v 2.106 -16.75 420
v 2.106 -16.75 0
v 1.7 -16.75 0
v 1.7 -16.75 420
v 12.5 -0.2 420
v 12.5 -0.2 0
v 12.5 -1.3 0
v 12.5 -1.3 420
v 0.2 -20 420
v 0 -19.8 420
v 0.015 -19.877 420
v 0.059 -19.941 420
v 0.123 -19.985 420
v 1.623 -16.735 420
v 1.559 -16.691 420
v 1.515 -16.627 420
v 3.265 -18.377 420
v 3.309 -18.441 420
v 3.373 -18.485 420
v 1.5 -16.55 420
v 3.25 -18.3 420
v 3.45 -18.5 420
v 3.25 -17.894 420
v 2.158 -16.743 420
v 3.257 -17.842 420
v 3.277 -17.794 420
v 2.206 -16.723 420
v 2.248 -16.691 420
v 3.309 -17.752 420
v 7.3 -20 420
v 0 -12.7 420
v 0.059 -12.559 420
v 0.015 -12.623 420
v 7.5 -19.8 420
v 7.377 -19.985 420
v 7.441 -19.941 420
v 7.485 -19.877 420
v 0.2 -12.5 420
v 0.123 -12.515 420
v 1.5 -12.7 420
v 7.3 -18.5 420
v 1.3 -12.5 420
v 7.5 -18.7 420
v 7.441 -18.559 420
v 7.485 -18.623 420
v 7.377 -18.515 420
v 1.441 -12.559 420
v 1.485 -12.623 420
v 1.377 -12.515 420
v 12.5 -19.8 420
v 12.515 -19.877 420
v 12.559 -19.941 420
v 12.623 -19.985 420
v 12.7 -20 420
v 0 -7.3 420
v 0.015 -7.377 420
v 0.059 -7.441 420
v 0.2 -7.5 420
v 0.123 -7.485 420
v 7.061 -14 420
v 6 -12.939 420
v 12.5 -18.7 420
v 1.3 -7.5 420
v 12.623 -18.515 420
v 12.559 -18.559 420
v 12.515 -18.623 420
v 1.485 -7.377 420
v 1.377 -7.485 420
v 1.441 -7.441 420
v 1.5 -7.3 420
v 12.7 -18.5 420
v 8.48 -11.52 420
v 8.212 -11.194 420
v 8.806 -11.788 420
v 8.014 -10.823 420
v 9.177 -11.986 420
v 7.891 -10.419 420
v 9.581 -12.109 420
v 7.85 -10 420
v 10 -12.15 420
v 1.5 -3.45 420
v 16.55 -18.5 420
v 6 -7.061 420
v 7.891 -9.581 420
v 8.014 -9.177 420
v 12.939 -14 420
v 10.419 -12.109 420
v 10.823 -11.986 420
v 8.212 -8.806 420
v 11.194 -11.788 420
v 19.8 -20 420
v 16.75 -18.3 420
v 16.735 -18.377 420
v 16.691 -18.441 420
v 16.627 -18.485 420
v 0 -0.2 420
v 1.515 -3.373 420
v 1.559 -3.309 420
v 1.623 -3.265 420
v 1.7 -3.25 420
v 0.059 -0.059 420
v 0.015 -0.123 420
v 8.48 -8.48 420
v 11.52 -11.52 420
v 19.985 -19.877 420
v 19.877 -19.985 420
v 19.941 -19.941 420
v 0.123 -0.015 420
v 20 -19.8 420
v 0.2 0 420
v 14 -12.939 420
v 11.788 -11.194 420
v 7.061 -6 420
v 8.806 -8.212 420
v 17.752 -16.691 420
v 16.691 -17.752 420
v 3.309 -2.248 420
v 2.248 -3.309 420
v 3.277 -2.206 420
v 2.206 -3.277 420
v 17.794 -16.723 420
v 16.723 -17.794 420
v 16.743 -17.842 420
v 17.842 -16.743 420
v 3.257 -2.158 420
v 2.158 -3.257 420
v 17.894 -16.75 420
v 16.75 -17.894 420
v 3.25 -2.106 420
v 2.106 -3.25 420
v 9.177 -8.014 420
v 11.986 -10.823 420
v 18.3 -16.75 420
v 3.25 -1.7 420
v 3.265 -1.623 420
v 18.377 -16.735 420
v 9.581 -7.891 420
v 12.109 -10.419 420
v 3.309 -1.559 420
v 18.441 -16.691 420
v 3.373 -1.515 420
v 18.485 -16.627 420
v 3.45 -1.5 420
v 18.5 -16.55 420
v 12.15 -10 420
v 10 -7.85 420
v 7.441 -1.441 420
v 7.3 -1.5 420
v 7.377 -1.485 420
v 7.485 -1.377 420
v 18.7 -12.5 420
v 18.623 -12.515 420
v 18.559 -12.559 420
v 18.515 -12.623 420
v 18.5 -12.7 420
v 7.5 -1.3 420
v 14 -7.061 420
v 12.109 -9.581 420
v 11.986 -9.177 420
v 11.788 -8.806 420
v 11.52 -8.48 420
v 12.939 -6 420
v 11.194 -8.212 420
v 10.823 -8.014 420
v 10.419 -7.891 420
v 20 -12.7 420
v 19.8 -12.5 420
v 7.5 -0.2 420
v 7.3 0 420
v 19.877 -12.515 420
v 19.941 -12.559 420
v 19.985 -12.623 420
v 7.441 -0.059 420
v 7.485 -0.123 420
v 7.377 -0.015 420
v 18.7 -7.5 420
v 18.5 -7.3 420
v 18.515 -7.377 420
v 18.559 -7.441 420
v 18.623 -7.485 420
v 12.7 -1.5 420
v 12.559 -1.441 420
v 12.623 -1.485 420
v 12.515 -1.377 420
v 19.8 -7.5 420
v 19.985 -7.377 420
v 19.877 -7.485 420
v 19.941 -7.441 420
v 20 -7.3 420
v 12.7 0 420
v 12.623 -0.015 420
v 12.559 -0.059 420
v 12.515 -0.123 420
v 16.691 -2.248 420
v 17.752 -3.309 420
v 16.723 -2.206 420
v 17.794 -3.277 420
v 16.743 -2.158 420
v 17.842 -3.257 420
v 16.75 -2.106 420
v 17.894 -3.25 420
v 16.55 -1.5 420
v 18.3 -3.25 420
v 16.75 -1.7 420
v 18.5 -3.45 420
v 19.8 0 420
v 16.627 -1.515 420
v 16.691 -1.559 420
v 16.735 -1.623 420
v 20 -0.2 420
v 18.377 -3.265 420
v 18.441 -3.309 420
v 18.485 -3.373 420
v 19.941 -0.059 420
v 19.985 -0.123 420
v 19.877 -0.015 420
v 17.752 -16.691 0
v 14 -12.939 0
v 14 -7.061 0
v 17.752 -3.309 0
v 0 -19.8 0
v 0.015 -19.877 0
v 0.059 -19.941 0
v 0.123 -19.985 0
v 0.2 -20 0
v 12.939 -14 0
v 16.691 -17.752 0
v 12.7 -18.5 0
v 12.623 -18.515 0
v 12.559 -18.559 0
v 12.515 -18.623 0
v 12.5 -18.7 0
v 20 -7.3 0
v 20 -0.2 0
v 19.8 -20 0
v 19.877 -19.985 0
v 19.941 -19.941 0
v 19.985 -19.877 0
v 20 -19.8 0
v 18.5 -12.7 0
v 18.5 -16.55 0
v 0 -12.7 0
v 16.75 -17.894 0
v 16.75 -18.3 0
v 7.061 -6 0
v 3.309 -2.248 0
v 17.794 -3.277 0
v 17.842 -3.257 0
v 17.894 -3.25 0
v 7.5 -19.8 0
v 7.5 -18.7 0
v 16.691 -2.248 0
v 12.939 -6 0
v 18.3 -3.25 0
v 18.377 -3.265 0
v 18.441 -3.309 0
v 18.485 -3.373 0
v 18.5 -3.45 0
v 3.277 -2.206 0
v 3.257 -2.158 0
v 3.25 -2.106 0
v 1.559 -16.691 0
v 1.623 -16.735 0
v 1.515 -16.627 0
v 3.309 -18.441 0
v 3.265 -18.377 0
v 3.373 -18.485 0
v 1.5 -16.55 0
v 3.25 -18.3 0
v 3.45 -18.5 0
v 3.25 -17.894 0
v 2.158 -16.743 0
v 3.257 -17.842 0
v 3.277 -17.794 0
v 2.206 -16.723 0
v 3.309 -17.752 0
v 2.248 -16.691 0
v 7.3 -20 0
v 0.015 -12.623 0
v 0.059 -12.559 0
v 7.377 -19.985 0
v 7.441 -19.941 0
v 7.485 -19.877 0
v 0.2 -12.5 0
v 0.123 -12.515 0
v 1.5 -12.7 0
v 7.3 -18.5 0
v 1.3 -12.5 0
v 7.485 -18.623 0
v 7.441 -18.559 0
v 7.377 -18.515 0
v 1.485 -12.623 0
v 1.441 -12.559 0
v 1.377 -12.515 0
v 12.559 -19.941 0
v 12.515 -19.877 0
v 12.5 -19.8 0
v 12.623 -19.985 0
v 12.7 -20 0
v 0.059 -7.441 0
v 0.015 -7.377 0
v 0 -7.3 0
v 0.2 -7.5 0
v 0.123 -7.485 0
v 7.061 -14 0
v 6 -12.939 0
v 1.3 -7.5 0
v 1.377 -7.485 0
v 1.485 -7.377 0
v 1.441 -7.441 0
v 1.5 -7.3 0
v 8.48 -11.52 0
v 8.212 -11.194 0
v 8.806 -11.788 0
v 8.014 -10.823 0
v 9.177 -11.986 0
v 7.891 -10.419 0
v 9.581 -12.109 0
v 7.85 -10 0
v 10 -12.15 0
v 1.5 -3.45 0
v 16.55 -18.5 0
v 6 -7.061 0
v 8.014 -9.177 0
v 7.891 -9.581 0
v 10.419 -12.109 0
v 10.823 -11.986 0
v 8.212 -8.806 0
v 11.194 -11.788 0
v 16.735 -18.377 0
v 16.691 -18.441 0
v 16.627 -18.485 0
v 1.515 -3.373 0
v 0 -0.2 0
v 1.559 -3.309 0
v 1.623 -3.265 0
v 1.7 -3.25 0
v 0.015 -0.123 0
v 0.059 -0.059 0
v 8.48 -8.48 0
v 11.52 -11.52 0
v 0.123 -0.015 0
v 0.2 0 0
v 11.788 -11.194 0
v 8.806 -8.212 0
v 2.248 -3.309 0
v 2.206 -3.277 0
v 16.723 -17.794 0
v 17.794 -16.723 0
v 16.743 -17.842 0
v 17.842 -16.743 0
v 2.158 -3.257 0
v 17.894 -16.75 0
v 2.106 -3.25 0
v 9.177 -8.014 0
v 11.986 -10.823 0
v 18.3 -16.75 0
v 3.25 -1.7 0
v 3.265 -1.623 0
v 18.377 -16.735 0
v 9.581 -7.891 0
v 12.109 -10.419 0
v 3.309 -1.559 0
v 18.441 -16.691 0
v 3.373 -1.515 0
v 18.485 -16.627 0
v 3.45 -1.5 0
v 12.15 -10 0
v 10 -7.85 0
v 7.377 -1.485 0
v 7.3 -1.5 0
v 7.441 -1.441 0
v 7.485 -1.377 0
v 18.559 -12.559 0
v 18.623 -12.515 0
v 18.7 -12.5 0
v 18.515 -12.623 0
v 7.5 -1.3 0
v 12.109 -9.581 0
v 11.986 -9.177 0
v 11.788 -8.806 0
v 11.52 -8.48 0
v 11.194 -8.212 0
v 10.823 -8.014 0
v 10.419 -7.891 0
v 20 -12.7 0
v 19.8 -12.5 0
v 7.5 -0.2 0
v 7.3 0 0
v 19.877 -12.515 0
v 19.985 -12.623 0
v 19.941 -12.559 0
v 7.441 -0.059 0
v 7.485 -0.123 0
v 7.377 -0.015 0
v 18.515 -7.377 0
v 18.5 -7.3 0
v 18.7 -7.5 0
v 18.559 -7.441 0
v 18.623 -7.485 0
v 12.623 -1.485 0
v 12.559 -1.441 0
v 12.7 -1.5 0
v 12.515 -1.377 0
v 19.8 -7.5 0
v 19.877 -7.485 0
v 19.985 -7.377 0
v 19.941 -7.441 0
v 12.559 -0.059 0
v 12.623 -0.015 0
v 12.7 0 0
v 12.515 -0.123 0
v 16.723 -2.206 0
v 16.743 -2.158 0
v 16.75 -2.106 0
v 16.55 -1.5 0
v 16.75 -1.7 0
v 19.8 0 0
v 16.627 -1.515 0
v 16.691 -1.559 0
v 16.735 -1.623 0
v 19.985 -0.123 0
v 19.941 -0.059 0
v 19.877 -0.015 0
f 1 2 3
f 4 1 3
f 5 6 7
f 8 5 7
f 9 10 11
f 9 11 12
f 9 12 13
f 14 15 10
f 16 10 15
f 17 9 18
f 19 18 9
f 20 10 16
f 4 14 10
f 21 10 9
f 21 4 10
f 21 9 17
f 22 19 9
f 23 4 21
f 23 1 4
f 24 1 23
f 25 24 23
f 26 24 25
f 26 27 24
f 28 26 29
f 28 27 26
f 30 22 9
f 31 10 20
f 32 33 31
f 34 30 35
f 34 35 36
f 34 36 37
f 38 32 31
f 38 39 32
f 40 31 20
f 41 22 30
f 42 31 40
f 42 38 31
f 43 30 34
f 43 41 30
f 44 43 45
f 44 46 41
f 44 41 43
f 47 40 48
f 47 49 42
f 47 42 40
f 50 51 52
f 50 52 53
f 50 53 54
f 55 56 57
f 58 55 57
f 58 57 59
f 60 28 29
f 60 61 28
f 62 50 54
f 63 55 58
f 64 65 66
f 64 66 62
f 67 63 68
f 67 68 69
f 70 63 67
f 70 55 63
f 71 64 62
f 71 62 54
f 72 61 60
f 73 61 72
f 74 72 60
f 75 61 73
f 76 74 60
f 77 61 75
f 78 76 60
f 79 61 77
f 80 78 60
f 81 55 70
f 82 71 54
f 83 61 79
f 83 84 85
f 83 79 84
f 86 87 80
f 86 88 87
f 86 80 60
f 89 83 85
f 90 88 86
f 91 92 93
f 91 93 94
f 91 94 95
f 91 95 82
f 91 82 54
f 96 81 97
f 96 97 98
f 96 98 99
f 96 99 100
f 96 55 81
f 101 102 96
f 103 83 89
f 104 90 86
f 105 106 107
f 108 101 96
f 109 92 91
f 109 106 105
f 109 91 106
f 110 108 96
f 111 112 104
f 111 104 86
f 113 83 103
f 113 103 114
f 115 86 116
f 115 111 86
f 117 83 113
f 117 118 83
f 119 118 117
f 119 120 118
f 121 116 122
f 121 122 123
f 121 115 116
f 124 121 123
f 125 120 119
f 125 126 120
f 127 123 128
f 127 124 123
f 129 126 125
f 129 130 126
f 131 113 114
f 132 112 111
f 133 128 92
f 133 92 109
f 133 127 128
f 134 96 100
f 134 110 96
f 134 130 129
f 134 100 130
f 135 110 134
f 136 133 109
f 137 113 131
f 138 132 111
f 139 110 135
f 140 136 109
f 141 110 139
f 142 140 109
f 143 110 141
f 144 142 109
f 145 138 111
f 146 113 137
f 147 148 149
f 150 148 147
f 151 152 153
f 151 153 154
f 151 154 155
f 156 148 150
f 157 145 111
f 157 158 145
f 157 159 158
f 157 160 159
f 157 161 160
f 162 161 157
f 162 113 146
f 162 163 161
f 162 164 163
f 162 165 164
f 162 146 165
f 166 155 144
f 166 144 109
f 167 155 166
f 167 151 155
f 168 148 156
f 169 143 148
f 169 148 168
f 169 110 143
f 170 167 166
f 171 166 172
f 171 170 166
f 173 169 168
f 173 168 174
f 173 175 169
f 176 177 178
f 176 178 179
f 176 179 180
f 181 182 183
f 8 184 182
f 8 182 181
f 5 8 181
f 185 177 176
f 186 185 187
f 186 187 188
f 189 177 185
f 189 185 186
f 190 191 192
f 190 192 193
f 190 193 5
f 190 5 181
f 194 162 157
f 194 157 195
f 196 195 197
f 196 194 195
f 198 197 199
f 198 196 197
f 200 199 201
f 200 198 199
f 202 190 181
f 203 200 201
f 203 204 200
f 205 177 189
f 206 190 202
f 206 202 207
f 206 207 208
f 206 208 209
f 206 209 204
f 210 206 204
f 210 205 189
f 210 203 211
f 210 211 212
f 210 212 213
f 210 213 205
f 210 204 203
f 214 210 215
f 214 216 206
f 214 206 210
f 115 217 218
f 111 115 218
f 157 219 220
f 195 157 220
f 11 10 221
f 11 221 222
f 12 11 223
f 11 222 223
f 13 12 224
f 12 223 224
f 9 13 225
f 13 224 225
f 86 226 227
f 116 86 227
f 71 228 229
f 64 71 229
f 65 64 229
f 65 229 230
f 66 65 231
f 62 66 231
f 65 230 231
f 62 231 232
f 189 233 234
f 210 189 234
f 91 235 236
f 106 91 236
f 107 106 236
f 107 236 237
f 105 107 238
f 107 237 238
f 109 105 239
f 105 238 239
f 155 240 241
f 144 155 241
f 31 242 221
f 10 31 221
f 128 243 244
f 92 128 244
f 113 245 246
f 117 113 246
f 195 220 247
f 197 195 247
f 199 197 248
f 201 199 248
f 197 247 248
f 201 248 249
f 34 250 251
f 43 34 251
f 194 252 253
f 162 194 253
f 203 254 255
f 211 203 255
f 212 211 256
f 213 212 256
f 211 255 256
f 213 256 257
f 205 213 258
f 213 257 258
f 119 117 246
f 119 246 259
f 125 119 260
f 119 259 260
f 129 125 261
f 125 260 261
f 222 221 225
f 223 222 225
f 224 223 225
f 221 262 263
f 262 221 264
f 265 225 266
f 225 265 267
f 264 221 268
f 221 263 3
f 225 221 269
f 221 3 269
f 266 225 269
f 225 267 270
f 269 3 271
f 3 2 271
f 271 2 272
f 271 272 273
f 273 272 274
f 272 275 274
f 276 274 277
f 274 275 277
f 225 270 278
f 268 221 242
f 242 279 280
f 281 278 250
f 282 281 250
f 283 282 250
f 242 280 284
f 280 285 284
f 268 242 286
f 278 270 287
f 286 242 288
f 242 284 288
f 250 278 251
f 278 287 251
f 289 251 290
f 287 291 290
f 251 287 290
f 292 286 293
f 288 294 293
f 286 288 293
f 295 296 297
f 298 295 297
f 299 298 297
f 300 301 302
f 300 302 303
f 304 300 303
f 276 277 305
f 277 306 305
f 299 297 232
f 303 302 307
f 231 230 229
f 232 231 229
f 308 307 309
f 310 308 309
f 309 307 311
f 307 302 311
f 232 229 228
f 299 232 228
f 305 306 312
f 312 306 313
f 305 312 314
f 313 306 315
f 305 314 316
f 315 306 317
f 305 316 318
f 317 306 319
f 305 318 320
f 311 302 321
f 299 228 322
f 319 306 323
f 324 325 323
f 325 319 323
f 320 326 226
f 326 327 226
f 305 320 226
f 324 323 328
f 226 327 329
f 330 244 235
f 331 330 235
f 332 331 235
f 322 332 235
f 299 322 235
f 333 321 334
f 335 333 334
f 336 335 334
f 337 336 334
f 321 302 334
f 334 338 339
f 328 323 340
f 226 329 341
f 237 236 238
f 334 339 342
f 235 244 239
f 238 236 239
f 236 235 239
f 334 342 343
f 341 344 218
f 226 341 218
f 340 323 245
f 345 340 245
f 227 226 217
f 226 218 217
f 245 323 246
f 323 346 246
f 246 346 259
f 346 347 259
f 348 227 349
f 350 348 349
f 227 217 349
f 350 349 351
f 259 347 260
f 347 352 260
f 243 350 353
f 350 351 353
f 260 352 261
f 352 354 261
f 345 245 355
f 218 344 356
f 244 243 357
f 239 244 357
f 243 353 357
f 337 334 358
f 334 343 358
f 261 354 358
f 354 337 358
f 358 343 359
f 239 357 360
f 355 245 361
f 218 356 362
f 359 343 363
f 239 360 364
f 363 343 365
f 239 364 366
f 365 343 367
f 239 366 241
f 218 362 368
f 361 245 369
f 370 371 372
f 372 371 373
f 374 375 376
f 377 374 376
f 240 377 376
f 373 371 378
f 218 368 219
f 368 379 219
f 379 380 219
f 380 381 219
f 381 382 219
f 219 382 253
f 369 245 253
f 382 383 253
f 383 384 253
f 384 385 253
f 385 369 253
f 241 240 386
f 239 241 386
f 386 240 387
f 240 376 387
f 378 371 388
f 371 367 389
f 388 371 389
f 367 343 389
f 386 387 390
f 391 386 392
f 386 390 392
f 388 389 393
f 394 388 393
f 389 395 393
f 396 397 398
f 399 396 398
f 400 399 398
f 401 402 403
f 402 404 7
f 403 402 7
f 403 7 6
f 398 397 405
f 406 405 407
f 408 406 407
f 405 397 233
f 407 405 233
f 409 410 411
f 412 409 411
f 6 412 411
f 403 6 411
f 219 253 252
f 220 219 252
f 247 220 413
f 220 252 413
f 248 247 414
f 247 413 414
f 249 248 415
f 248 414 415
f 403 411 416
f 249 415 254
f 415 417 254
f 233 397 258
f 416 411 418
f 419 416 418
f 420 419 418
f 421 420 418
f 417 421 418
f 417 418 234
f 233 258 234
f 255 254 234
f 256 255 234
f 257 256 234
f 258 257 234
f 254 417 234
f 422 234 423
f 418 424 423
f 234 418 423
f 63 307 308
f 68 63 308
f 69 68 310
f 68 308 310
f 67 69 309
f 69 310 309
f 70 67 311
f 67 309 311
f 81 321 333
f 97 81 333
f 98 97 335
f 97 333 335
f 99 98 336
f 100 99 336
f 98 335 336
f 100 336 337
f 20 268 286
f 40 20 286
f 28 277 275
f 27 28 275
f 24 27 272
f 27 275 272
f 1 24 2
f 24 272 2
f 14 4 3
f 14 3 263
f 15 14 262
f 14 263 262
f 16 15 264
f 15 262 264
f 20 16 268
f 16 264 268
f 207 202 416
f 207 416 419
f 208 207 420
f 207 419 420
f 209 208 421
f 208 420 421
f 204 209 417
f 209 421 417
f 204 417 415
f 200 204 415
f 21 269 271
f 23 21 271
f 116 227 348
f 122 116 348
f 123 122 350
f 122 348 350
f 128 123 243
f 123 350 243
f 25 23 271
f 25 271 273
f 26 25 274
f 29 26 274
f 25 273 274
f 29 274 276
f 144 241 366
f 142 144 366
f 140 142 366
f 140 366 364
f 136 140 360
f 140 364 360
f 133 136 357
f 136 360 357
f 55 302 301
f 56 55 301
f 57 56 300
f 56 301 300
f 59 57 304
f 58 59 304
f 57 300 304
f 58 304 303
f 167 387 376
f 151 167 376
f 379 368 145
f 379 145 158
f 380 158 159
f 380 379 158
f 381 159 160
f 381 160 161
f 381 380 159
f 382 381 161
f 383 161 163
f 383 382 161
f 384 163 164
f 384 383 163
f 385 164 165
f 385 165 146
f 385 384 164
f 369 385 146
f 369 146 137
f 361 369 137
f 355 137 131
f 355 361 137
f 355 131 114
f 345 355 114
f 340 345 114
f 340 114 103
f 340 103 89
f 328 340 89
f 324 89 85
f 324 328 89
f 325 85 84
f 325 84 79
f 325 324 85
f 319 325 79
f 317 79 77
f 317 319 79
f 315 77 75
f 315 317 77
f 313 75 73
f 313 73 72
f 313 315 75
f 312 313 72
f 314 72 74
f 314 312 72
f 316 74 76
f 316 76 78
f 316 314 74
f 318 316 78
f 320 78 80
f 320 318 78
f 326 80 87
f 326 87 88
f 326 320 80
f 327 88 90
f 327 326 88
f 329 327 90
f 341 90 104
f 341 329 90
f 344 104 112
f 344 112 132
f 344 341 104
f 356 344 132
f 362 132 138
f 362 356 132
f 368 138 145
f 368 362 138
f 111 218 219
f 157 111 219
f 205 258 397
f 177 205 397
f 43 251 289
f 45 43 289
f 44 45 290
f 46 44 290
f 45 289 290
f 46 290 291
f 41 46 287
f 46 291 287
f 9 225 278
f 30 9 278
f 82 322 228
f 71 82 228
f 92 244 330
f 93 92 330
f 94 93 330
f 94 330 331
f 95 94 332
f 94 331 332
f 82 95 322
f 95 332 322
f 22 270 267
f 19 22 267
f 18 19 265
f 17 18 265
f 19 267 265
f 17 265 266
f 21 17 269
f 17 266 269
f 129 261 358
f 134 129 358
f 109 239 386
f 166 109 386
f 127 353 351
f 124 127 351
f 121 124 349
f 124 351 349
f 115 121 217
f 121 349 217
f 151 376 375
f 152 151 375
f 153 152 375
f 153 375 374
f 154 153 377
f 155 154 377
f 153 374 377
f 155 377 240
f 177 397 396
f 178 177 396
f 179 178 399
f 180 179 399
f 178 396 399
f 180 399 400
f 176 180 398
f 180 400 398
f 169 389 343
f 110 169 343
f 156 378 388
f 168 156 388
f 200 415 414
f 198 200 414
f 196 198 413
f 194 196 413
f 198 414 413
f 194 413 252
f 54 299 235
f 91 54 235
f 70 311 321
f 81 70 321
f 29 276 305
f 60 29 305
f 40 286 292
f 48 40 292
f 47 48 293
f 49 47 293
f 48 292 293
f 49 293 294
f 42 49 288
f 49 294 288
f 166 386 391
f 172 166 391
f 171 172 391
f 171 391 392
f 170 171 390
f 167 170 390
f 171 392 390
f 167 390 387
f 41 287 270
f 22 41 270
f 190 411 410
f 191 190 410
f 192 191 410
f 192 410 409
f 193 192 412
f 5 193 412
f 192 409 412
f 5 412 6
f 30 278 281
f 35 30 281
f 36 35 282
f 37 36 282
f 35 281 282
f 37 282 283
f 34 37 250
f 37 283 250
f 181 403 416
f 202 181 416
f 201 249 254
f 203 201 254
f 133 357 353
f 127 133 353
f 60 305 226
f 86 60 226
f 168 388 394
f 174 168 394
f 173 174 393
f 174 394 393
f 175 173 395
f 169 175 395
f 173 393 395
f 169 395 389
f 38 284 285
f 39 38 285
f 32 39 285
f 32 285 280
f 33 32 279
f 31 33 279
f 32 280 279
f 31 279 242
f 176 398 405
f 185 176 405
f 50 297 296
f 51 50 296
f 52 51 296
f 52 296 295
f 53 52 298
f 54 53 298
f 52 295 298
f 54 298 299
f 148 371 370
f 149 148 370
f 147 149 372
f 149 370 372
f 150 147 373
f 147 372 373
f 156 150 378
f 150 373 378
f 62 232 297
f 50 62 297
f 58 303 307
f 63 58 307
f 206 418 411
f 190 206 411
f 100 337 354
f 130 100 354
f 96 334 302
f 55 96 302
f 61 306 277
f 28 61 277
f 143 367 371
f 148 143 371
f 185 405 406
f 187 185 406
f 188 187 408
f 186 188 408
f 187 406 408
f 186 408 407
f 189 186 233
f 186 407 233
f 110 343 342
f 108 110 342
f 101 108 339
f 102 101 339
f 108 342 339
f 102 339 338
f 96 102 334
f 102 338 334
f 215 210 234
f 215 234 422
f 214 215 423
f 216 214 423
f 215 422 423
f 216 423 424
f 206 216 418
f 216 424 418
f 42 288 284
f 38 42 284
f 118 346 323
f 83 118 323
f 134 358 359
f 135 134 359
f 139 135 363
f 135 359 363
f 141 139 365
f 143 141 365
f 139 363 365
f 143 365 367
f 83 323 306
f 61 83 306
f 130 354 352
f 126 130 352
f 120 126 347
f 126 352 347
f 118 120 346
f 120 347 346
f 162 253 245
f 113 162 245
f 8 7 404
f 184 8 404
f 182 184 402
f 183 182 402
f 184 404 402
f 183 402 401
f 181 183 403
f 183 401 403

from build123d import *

# Parameters (mm, degrees)
F0_R     = 2.15
F1_DEPTH = 420


with BuildPart() as f1:
    # F0 (on Top) → F1 (new body)
    with BuildSketch(Plane.XY):
        with BuildLine():
            ThreePointArc((20, -0.2), (19.941421, -0.058579), (19.8, 0))
            Line((19.8, 0), (12.7, 0))
            ThreePointArc((12.7, 0), (12.558579, -0.058579), (12.5, -0.2))
            Line((12.5, -0.2), (12.5, -1.3))
            ThreePointArc((12.5, -1.3), (12.558579, -1.441421), (12.7, -1.5))
            Line((12.7, -1.5), (16.55, -1.5))
            ThreePointArc((16.55, -1.5), (16.691421, -1.558579), (16.75, -1.7))
            Line((16.75, -1.7), (16.75, -2.106497))
            ThreePointArc((16.75, -2.106497), (16.734776, -2.183034), (16.691421, -2.247918))
            Line((16.691421, -2.247918), (12.93934, -6))
            Line((12.93934, -6), (7.06066, -6))
            Line((7.06066, -6), (3.308579, -2.247918))
            ThreePointArc((3.308579, -2.247918), (3.265224, -2.183034), (3.25, -2.106497))
            Line((3.25, -2.106497), (3.25, -1.7))
            ThreePointArc((3.25, -1.7), (3.308579, -1.558579), (3.45, -1.5))
            Line((3.45, -1.5), (7.3, -1.5))
            ThreePointArc((7.3, -1.5), (7.441421, -1.441421), (7.5, -1.3))
            Line((7.5, -1.3), (7.5, -0.2))
            ThreePointArc((7.5, -0.2), (7.441421, -0.058579), (7.3, 0))
            Line((7.3, 0), (0.2, 0))
            ThreePointArc((0.2, 0), (0.058579, -0.058579), (0, -0.2))
            Line((0, -0.2), (0, -7.3))
            ThreePointArc((0, -7.3), (0.058579, -7.441421), (0.2, -7.5))
            Line((0.2, -7.5), (1.3, -7.5))
            ThreePointArc((1.3, -7.5), (1.441421, -7.441421), (1.5, -7.3))
            Line((1.5, -7.3), (1.5, -3.45))
            ThreePointArc((1.5, -3.45), (1.558579, -3.308579), (1.7, -3.25))
            Line((1.7, -3.25), (2.106497, -3.25))
            ThreePointArc((2.106497, -3.25), (2.183034, -3.265224), (2.247918, -3.308579))
            Line((2.247918, -3.308579), (6, -7.06066))
            Line((6, -7.06066), (6, -12.93934))
            Line((6, -12.93934), (2.247918, -16.691421))
            ThreePointArc((2.247918, -16.691421), (2.183034, -16.734776), (2.106497, -16.75))
            Line((2.106497, -16.75), (1.7, -16.75))
            ThreePointArc((1.7, -16.75), (1.558579, -16.691421), (1.5, -16.55))
            Line((1.5, -16.55), (1.5, -12.7))
            ThreePointArc((1.5, -12.7), (1.441421, -12.558579), (1.3, -12.5))
            Line((1.3, -12.5), (0.2, -12.5))
            ThreePointArc((0.2, -12.5), (0.058579, -12.558579), (0, -12.7))
            Line((0, -12.7), (0, -19.8))
            ThreePointArc((0, -19.8), (0.058579, -19.941421), (0.2, -20))
            Line((0.2, -20), (7.3, -20))
            ThreePointArc((7.3, -20), (7.441421, -19.941421), (7.5, -19.8))
            Line((7.5, -19.8), (7.5, -18.7))
            ThreePointArc((7.5, -18.7), (7.441421, -18.558579), (7.3, -18.5))
            Line((7.3, -18.5), (3.45, -18.5))
            ThreePointArc((3.45, -18.5), (3.308579, -18.441421), (3.25, -18.3))
            Line((3.25, -18.3), (3.25, -17.893503))
            ThreePointArc((3.25, -17.893503), (3.265224, -17.816966), (3.308579, -17.752082))
            Line((3.308579, -17.752082), (7.06066, -14))
            Line((7.06066, -14), (12.93934, -14))
            Line((12.93934, -14), (16.691421, -17.752082))
            ThreePointArc((16.691421, -17.752082), (16.734776, -17.816966), (16.75, -17.893503))
            Line((16.75, -17.893503), (16.75, -18.3))
            ThreePointArc((16.75, -18.3), (16.691421, -18.441421), (16.55, -18.5))
            Line((16.55, -18.5), (12.7, -18.5))
            ThreePointArc((12.7, -18.5), (12.558579, -18.558579), (12.5, -18.7))
            Line((12.5, -18.7), (12.5, -19.8))
            ThreePointArc((12.5, -19.8), (12.558579, -19.941421), (12.7, -20))
            Line((12.7, -20), (19.8, -20))
            ThreePointArc((19.8, -20), (19.941421, -19.941421), (20, -19.8))
            Line((20, -19.8), (20, -12.7))
            ThreePointArc((20, -12.7), (19.941421, -12.558579), (19.8, -12.5))
            Line((19.8, -12.5), (18.7, -12.5))
            ThreePointArc((18.7, -12.5), (18.558579, -12.558579), (18.5, -12.7))
            Line((18.5, -12.7), (18.5, -16.55))
            ThreePointArc((18.5, -16.55), (18.441421, -16.691421), (18.3, -16.75))
            Line((18.3, -16.75), (17.893503, -16.75))
            ThreePointArc((17.893503, -16.75), (17.816966, -16.734776), (17.752082, -16.691421))
            Line((17.752082, -16.691421), (14, -12.93934))
            Line((14, -12.93934), (14, -7.06066))
            Line((14, -7.06066), (17.752082, -3.308579))
            ThreePointArc((17.752082, -3.308579), (17.816966, -3.265224), (17.893503, -3.25))
            Line((17.893503, -3.25), (18.3, -3.25))
            ThreePointArc((18.3, -3.25), (18.441421, -3.308579), (18.5, -3.45))
            Line((18.5, -3.45), (18.5, -7.3))
            ThreePointArc((18.5, -7.3), (18.558579, -7.441421), (18.7, -7.5))
            Line((18.7, -7.5), (19.8, -7.5))
            ThreePointArc((19.8, -7.5), (19.941421, -7.441421), (20, -7.3))
            Line((20, -7.3), (20, -0.2))
        make_face()
        with Locations((10, -10)):
            Circle(F0_R, mode=Mode.SUBTRACT)
    extrude(amount=F1_DEPTH)


solid = f1.part
